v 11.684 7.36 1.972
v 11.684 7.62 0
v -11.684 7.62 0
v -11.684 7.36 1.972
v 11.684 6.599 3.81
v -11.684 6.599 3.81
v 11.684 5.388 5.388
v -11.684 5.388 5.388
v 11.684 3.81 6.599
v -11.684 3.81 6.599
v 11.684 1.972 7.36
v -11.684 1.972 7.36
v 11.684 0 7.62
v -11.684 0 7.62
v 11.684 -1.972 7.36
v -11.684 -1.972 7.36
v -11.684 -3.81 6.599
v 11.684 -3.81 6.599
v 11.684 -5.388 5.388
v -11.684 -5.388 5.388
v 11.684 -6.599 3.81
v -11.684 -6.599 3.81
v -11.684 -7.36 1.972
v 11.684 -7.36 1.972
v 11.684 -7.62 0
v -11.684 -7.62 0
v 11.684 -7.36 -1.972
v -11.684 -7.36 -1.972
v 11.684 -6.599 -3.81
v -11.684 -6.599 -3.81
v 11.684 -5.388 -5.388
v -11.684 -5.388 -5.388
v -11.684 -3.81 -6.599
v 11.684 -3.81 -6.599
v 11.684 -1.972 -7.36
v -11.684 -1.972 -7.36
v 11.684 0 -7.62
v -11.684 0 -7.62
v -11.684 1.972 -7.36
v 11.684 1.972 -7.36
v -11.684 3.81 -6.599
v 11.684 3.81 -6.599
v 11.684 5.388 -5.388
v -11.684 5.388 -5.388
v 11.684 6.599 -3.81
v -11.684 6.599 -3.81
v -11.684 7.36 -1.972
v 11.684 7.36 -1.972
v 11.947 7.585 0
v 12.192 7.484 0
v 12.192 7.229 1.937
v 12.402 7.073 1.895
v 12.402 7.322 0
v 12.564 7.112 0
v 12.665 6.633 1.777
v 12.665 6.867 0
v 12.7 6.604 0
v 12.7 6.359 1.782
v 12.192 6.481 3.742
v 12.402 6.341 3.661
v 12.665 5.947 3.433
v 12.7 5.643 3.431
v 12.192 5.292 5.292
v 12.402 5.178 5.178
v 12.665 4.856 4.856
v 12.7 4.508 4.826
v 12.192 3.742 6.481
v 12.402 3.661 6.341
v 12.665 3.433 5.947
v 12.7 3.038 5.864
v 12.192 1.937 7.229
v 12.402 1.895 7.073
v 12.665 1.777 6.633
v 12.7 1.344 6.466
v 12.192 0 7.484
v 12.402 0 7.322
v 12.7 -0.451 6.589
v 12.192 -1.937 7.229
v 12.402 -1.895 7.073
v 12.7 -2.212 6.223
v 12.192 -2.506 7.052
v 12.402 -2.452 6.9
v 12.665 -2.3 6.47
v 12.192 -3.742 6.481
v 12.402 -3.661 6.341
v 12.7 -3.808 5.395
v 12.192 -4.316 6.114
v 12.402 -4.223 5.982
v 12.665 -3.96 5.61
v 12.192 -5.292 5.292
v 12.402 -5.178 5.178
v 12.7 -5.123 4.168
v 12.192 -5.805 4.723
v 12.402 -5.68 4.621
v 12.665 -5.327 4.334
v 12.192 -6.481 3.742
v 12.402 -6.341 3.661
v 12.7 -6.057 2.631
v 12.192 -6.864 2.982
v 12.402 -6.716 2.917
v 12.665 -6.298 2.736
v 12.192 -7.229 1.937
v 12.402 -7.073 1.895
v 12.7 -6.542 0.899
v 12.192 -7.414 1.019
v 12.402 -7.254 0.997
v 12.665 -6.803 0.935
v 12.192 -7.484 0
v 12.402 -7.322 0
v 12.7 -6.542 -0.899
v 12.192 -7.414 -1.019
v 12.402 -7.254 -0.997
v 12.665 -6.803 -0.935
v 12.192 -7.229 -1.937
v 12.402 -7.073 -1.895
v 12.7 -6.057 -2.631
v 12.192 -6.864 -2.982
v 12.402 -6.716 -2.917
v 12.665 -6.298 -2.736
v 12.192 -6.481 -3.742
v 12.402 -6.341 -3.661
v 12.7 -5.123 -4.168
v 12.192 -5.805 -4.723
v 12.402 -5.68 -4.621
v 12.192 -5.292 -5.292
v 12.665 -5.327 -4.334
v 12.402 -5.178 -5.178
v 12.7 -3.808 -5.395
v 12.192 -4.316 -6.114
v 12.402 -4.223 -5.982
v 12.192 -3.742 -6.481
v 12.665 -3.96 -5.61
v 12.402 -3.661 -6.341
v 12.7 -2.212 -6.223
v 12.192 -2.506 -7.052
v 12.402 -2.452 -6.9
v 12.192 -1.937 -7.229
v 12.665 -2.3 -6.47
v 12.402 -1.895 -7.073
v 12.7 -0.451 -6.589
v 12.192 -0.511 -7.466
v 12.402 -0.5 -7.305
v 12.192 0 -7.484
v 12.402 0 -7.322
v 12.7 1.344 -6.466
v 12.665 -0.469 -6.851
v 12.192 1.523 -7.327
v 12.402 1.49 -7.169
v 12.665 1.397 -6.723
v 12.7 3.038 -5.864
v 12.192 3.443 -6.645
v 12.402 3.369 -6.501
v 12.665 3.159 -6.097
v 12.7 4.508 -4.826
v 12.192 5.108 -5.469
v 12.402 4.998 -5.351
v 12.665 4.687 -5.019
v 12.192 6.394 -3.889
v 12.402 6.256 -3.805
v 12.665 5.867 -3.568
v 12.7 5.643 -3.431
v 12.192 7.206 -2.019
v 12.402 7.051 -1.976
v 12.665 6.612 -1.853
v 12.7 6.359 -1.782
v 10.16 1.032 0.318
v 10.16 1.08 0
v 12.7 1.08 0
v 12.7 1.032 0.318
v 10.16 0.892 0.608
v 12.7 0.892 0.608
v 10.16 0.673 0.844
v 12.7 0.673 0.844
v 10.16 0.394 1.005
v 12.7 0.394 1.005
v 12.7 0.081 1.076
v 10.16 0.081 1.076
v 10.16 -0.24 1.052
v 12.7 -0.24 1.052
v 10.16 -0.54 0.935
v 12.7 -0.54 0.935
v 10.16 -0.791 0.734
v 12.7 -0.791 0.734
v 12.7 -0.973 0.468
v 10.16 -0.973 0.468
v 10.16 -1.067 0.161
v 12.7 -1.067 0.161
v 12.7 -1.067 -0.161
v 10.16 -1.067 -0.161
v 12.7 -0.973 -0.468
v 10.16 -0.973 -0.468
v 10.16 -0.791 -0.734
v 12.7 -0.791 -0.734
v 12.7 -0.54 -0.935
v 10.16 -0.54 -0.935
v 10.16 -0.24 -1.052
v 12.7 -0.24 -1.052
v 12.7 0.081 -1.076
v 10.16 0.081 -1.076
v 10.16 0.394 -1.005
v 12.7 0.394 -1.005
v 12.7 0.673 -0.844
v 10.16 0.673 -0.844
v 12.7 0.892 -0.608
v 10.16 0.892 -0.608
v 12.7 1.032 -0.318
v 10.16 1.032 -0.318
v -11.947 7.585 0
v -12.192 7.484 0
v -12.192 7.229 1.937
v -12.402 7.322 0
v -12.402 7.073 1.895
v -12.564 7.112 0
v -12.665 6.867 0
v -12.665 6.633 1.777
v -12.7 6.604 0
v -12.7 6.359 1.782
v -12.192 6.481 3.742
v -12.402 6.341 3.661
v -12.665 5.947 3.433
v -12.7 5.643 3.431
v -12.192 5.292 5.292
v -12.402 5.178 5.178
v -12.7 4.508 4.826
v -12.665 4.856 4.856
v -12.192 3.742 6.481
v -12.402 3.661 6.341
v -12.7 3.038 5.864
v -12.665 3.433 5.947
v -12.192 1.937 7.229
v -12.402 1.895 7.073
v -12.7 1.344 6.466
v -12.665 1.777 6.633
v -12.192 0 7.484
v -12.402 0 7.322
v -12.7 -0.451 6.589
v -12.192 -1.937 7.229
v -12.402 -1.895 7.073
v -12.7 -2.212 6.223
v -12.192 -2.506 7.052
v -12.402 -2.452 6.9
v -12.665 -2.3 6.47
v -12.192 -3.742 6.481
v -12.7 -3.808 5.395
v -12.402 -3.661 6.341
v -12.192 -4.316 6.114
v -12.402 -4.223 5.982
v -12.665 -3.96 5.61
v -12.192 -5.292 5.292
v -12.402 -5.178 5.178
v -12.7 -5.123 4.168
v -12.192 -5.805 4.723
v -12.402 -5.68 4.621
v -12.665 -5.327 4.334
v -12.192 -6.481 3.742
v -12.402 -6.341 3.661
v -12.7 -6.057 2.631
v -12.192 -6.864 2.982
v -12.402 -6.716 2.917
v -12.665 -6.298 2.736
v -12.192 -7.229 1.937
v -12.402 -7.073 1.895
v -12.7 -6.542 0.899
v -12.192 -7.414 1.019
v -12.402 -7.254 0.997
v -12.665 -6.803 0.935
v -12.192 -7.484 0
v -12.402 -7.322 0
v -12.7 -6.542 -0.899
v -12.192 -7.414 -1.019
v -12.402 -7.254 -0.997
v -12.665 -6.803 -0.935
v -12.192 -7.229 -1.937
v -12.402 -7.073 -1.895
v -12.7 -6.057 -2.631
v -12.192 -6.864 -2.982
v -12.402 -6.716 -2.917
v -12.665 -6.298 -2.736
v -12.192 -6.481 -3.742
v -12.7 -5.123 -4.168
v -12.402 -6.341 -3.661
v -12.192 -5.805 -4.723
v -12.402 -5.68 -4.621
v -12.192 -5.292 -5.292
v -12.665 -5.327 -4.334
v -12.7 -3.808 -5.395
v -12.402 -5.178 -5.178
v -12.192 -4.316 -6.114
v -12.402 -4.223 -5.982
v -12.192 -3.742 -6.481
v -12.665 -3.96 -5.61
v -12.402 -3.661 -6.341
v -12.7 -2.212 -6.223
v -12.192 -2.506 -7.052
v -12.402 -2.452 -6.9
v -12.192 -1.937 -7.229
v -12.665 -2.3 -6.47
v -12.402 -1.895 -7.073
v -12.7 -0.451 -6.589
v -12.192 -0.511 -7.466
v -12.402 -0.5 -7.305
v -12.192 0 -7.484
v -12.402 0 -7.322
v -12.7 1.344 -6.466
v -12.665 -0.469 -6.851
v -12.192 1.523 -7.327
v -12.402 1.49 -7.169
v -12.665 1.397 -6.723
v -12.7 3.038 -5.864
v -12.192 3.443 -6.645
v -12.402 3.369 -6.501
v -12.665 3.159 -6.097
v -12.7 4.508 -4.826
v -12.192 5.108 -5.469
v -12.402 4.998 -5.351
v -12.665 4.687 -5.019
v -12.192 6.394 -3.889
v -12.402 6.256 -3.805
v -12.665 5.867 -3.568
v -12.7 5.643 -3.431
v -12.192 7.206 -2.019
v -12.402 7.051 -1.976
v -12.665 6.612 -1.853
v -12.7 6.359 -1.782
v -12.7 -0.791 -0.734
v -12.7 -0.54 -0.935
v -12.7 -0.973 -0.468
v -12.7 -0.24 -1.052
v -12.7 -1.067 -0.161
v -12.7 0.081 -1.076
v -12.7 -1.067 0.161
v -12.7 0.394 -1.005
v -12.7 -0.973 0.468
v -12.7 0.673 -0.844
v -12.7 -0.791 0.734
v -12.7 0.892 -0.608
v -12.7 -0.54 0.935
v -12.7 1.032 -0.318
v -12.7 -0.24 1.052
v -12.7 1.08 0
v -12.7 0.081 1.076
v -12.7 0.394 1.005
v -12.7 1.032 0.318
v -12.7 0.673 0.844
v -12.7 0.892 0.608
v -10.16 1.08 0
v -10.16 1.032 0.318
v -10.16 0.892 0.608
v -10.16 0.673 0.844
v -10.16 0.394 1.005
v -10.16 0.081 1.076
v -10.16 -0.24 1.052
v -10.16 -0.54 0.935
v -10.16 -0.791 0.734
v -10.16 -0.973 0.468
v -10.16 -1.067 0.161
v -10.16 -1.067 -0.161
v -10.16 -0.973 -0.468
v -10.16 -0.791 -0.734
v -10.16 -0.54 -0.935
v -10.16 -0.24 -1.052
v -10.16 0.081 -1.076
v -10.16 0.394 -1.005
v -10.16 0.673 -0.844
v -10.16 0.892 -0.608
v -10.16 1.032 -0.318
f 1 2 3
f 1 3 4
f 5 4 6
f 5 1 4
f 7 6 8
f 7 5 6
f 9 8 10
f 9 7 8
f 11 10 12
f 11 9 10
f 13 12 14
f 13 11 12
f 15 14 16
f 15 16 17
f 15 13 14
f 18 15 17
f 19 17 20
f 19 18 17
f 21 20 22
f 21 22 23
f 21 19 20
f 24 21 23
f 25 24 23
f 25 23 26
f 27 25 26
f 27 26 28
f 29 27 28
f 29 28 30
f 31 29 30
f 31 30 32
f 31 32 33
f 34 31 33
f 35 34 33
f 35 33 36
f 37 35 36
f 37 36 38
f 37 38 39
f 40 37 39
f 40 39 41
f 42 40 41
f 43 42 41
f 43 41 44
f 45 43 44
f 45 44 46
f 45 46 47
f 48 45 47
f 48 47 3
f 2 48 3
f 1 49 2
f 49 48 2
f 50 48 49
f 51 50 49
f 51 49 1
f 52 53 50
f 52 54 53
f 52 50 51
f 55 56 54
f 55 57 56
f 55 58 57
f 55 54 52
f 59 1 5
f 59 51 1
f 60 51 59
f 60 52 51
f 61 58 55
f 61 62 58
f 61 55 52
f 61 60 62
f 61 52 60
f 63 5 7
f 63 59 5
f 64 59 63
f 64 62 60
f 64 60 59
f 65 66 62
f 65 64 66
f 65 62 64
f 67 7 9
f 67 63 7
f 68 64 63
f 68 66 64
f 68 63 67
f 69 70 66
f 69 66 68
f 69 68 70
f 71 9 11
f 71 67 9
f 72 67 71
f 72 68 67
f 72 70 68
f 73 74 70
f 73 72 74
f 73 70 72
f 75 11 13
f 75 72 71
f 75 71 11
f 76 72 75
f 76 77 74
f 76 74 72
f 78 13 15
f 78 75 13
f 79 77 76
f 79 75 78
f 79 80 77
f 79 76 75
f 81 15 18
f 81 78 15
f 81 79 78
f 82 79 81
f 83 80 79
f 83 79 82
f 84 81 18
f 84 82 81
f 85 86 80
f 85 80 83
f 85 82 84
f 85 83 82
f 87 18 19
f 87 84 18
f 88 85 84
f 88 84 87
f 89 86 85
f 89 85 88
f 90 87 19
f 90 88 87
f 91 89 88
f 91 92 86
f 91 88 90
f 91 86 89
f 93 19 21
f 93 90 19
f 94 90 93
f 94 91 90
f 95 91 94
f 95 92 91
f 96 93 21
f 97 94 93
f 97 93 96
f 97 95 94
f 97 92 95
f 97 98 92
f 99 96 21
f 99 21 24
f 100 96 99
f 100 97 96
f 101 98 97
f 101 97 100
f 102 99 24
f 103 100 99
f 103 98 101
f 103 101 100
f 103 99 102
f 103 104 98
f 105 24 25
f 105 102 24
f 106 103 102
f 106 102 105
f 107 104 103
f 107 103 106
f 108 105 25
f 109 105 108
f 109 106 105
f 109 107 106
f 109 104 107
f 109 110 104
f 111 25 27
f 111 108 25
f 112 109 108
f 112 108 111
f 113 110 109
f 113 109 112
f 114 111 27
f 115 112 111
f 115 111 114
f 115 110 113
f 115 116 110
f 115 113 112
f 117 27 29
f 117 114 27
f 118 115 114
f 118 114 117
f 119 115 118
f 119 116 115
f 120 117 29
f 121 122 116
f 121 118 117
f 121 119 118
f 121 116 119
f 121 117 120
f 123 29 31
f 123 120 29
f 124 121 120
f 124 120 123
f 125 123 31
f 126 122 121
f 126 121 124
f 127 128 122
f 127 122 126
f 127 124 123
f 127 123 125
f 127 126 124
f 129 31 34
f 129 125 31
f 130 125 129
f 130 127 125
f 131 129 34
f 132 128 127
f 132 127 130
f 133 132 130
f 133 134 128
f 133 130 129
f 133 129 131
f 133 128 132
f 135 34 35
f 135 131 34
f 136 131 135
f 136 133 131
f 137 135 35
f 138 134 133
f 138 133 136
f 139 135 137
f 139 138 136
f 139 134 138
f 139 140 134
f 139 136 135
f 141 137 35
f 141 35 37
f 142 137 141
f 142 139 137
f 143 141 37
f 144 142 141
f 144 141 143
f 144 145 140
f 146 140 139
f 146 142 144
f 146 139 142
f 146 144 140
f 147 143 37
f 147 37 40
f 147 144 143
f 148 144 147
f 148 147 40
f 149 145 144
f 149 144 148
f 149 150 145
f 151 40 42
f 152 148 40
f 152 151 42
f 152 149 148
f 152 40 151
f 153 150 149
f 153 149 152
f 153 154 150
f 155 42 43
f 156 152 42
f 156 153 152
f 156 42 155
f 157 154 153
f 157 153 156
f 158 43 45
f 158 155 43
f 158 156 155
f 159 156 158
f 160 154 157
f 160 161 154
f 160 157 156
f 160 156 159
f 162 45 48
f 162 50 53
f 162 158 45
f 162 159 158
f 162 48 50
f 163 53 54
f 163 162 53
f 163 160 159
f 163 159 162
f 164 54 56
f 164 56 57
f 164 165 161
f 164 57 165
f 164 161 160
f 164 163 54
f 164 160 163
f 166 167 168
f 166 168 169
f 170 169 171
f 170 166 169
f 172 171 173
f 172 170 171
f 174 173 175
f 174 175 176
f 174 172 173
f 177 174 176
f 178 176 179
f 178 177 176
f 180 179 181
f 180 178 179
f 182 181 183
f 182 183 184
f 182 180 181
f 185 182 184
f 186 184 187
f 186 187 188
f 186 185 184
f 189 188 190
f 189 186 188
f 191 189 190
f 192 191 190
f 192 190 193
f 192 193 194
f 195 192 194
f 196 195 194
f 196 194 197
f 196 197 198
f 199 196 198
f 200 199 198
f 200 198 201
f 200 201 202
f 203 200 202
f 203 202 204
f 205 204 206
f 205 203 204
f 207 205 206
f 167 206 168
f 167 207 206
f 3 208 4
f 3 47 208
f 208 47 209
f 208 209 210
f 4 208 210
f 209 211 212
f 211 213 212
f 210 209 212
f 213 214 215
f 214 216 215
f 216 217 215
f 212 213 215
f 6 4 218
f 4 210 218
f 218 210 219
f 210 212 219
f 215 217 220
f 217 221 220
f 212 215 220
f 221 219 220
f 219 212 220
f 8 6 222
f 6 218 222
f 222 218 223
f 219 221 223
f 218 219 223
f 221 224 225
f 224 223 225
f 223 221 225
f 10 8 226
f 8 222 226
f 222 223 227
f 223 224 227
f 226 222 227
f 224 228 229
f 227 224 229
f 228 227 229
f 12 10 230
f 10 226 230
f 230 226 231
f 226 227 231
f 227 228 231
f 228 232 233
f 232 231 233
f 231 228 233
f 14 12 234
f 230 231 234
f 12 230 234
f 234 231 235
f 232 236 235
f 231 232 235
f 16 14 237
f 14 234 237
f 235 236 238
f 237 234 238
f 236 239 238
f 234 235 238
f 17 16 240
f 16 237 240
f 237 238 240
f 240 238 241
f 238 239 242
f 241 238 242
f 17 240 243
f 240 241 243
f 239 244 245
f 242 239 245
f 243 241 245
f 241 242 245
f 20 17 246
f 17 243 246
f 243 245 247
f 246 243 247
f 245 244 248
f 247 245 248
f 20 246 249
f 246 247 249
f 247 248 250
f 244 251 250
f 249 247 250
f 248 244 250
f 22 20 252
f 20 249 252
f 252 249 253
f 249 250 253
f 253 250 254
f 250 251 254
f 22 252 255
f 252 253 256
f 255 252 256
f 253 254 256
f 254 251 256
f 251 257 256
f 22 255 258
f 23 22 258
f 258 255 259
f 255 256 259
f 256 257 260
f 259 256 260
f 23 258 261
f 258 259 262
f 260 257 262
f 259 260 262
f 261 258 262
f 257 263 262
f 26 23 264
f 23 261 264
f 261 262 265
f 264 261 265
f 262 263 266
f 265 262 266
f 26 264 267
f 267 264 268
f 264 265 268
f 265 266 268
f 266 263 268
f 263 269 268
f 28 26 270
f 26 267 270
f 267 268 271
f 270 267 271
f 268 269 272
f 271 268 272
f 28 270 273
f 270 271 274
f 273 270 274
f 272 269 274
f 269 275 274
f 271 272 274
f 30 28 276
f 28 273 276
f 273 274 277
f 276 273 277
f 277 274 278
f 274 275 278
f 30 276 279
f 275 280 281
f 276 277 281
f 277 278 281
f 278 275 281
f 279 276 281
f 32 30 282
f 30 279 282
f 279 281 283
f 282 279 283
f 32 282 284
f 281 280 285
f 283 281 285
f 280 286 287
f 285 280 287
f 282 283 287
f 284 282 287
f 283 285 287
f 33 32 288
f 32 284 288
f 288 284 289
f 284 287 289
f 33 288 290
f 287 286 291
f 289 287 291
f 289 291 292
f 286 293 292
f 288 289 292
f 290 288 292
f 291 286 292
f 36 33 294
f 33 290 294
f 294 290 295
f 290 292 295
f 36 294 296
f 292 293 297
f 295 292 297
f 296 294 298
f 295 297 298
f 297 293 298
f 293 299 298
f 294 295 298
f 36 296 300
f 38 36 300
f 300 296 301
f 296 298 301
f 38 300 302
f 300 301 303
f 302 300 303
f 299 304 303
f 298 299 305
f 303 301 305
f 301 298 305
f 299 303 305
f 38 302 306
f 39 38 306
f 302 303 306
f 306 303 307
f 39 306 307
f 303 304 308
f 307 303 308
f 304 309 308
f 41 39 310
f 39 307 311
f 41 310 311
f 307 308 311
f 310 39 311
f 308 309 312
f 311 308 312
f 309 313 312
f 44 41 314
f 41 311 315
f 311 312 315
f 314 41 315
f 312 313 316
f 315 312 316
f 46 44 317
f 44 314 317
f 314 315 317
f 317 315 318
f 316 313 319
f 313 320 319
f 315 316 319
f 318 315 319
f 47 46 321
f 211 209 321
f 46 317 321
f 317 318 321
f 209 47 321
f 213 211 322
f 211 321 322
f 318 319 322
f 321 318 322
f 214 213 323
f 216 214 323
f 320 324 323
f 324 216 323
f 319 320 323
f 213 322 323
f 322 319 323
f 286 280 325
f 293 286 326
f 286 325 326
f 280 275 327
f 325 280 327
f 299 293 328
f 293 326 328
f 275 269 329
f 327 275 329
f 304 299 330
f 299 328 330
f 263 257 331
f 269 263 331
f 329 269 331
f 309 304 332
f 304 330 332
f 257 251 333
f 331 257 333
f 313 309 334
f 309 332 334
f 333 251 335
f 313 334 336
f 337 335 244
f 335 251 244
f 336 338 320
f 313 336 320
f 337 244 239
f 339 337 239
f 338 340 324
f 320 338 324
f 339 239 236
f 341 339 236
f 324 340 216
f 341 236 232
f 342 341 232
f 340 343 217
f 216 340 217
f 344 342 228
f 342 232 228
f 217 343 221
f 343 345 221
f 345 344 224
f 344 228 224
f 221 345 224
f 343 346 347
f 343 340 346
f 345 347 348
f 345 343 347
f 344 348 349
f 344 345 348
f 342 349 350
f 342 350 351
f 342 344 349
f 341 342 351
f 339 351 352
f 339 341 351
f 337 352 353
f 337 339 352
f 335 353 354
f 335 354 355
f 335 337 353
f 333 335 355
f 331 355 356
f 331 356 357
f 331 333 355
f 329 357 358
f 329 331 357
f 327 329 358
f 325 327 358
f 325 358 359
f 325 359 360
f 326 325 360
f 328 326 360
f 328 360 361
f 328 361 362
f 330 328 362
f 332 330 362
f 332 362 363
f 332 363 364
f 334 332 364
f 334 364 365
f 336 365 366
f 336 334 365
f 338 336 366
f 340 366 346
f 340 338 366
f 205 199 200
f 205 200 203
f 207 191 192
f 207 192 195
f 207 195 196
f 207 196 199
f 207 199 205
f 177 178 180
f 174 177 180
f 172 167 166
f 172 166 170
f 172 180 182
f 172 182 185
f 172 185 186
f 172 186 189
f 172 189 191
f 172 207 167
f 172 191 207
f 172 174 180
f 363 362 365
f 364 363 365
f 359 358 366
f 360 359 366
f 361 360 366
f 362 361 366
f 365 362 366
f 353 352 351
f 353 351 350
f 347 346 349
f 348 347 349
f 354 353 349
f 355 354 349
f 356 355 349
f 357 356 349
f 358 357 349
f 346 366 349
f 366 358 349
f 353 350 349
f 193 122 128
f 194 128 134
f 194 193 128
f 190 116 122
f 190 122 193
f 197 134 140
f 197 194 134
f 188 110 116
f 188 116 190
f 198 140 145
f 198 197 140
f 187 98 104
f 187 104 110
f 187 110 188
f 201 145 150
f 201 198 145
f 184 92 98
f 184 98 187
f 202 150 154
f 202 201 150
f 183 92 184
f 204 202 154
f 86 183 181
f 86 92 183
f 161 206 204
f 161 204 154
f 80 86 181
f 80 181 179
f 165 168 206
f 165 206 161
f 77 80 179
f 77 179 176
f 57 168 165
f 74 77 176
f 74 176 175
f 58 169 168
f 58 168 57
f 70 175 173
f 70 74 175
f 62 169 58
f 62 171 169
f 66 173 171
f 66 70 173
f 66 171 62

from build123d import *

# Parameters (mm, degrees)
F0_R     = 7.62
F0_R_2   = 1.0795
F1_DEPTH = 12.7
F2_DEPTH = 10.16
F3_R     = 1.016


with BuildPart() as f1:
    # F0 (on Right) → F1 (new body, symmetric)
    with BuildSketch(Plane.YZ):
        Circle(F0_R)
        Circle(F0_R_2, mode=Mode.SUBTRACT)
    extrude(amount=F1_DEPTH, both=True)

    # F0 (on Right) → F2 (join, symmetric)
    with BuildSketch(Plane.YZ):
        Circle(F0_R_2)
    extrude(amount=F2_DEPTH, both=True)

    # F3
    f3_edges = [f1.edges().sort_by_distance(p)[0] for p in [
        (12.7, -7.62, 0),
        (-12.7, -7.62, 0),
    ]]
    fillet(f3_edges, radius=F3_R)


solid = f1.part
